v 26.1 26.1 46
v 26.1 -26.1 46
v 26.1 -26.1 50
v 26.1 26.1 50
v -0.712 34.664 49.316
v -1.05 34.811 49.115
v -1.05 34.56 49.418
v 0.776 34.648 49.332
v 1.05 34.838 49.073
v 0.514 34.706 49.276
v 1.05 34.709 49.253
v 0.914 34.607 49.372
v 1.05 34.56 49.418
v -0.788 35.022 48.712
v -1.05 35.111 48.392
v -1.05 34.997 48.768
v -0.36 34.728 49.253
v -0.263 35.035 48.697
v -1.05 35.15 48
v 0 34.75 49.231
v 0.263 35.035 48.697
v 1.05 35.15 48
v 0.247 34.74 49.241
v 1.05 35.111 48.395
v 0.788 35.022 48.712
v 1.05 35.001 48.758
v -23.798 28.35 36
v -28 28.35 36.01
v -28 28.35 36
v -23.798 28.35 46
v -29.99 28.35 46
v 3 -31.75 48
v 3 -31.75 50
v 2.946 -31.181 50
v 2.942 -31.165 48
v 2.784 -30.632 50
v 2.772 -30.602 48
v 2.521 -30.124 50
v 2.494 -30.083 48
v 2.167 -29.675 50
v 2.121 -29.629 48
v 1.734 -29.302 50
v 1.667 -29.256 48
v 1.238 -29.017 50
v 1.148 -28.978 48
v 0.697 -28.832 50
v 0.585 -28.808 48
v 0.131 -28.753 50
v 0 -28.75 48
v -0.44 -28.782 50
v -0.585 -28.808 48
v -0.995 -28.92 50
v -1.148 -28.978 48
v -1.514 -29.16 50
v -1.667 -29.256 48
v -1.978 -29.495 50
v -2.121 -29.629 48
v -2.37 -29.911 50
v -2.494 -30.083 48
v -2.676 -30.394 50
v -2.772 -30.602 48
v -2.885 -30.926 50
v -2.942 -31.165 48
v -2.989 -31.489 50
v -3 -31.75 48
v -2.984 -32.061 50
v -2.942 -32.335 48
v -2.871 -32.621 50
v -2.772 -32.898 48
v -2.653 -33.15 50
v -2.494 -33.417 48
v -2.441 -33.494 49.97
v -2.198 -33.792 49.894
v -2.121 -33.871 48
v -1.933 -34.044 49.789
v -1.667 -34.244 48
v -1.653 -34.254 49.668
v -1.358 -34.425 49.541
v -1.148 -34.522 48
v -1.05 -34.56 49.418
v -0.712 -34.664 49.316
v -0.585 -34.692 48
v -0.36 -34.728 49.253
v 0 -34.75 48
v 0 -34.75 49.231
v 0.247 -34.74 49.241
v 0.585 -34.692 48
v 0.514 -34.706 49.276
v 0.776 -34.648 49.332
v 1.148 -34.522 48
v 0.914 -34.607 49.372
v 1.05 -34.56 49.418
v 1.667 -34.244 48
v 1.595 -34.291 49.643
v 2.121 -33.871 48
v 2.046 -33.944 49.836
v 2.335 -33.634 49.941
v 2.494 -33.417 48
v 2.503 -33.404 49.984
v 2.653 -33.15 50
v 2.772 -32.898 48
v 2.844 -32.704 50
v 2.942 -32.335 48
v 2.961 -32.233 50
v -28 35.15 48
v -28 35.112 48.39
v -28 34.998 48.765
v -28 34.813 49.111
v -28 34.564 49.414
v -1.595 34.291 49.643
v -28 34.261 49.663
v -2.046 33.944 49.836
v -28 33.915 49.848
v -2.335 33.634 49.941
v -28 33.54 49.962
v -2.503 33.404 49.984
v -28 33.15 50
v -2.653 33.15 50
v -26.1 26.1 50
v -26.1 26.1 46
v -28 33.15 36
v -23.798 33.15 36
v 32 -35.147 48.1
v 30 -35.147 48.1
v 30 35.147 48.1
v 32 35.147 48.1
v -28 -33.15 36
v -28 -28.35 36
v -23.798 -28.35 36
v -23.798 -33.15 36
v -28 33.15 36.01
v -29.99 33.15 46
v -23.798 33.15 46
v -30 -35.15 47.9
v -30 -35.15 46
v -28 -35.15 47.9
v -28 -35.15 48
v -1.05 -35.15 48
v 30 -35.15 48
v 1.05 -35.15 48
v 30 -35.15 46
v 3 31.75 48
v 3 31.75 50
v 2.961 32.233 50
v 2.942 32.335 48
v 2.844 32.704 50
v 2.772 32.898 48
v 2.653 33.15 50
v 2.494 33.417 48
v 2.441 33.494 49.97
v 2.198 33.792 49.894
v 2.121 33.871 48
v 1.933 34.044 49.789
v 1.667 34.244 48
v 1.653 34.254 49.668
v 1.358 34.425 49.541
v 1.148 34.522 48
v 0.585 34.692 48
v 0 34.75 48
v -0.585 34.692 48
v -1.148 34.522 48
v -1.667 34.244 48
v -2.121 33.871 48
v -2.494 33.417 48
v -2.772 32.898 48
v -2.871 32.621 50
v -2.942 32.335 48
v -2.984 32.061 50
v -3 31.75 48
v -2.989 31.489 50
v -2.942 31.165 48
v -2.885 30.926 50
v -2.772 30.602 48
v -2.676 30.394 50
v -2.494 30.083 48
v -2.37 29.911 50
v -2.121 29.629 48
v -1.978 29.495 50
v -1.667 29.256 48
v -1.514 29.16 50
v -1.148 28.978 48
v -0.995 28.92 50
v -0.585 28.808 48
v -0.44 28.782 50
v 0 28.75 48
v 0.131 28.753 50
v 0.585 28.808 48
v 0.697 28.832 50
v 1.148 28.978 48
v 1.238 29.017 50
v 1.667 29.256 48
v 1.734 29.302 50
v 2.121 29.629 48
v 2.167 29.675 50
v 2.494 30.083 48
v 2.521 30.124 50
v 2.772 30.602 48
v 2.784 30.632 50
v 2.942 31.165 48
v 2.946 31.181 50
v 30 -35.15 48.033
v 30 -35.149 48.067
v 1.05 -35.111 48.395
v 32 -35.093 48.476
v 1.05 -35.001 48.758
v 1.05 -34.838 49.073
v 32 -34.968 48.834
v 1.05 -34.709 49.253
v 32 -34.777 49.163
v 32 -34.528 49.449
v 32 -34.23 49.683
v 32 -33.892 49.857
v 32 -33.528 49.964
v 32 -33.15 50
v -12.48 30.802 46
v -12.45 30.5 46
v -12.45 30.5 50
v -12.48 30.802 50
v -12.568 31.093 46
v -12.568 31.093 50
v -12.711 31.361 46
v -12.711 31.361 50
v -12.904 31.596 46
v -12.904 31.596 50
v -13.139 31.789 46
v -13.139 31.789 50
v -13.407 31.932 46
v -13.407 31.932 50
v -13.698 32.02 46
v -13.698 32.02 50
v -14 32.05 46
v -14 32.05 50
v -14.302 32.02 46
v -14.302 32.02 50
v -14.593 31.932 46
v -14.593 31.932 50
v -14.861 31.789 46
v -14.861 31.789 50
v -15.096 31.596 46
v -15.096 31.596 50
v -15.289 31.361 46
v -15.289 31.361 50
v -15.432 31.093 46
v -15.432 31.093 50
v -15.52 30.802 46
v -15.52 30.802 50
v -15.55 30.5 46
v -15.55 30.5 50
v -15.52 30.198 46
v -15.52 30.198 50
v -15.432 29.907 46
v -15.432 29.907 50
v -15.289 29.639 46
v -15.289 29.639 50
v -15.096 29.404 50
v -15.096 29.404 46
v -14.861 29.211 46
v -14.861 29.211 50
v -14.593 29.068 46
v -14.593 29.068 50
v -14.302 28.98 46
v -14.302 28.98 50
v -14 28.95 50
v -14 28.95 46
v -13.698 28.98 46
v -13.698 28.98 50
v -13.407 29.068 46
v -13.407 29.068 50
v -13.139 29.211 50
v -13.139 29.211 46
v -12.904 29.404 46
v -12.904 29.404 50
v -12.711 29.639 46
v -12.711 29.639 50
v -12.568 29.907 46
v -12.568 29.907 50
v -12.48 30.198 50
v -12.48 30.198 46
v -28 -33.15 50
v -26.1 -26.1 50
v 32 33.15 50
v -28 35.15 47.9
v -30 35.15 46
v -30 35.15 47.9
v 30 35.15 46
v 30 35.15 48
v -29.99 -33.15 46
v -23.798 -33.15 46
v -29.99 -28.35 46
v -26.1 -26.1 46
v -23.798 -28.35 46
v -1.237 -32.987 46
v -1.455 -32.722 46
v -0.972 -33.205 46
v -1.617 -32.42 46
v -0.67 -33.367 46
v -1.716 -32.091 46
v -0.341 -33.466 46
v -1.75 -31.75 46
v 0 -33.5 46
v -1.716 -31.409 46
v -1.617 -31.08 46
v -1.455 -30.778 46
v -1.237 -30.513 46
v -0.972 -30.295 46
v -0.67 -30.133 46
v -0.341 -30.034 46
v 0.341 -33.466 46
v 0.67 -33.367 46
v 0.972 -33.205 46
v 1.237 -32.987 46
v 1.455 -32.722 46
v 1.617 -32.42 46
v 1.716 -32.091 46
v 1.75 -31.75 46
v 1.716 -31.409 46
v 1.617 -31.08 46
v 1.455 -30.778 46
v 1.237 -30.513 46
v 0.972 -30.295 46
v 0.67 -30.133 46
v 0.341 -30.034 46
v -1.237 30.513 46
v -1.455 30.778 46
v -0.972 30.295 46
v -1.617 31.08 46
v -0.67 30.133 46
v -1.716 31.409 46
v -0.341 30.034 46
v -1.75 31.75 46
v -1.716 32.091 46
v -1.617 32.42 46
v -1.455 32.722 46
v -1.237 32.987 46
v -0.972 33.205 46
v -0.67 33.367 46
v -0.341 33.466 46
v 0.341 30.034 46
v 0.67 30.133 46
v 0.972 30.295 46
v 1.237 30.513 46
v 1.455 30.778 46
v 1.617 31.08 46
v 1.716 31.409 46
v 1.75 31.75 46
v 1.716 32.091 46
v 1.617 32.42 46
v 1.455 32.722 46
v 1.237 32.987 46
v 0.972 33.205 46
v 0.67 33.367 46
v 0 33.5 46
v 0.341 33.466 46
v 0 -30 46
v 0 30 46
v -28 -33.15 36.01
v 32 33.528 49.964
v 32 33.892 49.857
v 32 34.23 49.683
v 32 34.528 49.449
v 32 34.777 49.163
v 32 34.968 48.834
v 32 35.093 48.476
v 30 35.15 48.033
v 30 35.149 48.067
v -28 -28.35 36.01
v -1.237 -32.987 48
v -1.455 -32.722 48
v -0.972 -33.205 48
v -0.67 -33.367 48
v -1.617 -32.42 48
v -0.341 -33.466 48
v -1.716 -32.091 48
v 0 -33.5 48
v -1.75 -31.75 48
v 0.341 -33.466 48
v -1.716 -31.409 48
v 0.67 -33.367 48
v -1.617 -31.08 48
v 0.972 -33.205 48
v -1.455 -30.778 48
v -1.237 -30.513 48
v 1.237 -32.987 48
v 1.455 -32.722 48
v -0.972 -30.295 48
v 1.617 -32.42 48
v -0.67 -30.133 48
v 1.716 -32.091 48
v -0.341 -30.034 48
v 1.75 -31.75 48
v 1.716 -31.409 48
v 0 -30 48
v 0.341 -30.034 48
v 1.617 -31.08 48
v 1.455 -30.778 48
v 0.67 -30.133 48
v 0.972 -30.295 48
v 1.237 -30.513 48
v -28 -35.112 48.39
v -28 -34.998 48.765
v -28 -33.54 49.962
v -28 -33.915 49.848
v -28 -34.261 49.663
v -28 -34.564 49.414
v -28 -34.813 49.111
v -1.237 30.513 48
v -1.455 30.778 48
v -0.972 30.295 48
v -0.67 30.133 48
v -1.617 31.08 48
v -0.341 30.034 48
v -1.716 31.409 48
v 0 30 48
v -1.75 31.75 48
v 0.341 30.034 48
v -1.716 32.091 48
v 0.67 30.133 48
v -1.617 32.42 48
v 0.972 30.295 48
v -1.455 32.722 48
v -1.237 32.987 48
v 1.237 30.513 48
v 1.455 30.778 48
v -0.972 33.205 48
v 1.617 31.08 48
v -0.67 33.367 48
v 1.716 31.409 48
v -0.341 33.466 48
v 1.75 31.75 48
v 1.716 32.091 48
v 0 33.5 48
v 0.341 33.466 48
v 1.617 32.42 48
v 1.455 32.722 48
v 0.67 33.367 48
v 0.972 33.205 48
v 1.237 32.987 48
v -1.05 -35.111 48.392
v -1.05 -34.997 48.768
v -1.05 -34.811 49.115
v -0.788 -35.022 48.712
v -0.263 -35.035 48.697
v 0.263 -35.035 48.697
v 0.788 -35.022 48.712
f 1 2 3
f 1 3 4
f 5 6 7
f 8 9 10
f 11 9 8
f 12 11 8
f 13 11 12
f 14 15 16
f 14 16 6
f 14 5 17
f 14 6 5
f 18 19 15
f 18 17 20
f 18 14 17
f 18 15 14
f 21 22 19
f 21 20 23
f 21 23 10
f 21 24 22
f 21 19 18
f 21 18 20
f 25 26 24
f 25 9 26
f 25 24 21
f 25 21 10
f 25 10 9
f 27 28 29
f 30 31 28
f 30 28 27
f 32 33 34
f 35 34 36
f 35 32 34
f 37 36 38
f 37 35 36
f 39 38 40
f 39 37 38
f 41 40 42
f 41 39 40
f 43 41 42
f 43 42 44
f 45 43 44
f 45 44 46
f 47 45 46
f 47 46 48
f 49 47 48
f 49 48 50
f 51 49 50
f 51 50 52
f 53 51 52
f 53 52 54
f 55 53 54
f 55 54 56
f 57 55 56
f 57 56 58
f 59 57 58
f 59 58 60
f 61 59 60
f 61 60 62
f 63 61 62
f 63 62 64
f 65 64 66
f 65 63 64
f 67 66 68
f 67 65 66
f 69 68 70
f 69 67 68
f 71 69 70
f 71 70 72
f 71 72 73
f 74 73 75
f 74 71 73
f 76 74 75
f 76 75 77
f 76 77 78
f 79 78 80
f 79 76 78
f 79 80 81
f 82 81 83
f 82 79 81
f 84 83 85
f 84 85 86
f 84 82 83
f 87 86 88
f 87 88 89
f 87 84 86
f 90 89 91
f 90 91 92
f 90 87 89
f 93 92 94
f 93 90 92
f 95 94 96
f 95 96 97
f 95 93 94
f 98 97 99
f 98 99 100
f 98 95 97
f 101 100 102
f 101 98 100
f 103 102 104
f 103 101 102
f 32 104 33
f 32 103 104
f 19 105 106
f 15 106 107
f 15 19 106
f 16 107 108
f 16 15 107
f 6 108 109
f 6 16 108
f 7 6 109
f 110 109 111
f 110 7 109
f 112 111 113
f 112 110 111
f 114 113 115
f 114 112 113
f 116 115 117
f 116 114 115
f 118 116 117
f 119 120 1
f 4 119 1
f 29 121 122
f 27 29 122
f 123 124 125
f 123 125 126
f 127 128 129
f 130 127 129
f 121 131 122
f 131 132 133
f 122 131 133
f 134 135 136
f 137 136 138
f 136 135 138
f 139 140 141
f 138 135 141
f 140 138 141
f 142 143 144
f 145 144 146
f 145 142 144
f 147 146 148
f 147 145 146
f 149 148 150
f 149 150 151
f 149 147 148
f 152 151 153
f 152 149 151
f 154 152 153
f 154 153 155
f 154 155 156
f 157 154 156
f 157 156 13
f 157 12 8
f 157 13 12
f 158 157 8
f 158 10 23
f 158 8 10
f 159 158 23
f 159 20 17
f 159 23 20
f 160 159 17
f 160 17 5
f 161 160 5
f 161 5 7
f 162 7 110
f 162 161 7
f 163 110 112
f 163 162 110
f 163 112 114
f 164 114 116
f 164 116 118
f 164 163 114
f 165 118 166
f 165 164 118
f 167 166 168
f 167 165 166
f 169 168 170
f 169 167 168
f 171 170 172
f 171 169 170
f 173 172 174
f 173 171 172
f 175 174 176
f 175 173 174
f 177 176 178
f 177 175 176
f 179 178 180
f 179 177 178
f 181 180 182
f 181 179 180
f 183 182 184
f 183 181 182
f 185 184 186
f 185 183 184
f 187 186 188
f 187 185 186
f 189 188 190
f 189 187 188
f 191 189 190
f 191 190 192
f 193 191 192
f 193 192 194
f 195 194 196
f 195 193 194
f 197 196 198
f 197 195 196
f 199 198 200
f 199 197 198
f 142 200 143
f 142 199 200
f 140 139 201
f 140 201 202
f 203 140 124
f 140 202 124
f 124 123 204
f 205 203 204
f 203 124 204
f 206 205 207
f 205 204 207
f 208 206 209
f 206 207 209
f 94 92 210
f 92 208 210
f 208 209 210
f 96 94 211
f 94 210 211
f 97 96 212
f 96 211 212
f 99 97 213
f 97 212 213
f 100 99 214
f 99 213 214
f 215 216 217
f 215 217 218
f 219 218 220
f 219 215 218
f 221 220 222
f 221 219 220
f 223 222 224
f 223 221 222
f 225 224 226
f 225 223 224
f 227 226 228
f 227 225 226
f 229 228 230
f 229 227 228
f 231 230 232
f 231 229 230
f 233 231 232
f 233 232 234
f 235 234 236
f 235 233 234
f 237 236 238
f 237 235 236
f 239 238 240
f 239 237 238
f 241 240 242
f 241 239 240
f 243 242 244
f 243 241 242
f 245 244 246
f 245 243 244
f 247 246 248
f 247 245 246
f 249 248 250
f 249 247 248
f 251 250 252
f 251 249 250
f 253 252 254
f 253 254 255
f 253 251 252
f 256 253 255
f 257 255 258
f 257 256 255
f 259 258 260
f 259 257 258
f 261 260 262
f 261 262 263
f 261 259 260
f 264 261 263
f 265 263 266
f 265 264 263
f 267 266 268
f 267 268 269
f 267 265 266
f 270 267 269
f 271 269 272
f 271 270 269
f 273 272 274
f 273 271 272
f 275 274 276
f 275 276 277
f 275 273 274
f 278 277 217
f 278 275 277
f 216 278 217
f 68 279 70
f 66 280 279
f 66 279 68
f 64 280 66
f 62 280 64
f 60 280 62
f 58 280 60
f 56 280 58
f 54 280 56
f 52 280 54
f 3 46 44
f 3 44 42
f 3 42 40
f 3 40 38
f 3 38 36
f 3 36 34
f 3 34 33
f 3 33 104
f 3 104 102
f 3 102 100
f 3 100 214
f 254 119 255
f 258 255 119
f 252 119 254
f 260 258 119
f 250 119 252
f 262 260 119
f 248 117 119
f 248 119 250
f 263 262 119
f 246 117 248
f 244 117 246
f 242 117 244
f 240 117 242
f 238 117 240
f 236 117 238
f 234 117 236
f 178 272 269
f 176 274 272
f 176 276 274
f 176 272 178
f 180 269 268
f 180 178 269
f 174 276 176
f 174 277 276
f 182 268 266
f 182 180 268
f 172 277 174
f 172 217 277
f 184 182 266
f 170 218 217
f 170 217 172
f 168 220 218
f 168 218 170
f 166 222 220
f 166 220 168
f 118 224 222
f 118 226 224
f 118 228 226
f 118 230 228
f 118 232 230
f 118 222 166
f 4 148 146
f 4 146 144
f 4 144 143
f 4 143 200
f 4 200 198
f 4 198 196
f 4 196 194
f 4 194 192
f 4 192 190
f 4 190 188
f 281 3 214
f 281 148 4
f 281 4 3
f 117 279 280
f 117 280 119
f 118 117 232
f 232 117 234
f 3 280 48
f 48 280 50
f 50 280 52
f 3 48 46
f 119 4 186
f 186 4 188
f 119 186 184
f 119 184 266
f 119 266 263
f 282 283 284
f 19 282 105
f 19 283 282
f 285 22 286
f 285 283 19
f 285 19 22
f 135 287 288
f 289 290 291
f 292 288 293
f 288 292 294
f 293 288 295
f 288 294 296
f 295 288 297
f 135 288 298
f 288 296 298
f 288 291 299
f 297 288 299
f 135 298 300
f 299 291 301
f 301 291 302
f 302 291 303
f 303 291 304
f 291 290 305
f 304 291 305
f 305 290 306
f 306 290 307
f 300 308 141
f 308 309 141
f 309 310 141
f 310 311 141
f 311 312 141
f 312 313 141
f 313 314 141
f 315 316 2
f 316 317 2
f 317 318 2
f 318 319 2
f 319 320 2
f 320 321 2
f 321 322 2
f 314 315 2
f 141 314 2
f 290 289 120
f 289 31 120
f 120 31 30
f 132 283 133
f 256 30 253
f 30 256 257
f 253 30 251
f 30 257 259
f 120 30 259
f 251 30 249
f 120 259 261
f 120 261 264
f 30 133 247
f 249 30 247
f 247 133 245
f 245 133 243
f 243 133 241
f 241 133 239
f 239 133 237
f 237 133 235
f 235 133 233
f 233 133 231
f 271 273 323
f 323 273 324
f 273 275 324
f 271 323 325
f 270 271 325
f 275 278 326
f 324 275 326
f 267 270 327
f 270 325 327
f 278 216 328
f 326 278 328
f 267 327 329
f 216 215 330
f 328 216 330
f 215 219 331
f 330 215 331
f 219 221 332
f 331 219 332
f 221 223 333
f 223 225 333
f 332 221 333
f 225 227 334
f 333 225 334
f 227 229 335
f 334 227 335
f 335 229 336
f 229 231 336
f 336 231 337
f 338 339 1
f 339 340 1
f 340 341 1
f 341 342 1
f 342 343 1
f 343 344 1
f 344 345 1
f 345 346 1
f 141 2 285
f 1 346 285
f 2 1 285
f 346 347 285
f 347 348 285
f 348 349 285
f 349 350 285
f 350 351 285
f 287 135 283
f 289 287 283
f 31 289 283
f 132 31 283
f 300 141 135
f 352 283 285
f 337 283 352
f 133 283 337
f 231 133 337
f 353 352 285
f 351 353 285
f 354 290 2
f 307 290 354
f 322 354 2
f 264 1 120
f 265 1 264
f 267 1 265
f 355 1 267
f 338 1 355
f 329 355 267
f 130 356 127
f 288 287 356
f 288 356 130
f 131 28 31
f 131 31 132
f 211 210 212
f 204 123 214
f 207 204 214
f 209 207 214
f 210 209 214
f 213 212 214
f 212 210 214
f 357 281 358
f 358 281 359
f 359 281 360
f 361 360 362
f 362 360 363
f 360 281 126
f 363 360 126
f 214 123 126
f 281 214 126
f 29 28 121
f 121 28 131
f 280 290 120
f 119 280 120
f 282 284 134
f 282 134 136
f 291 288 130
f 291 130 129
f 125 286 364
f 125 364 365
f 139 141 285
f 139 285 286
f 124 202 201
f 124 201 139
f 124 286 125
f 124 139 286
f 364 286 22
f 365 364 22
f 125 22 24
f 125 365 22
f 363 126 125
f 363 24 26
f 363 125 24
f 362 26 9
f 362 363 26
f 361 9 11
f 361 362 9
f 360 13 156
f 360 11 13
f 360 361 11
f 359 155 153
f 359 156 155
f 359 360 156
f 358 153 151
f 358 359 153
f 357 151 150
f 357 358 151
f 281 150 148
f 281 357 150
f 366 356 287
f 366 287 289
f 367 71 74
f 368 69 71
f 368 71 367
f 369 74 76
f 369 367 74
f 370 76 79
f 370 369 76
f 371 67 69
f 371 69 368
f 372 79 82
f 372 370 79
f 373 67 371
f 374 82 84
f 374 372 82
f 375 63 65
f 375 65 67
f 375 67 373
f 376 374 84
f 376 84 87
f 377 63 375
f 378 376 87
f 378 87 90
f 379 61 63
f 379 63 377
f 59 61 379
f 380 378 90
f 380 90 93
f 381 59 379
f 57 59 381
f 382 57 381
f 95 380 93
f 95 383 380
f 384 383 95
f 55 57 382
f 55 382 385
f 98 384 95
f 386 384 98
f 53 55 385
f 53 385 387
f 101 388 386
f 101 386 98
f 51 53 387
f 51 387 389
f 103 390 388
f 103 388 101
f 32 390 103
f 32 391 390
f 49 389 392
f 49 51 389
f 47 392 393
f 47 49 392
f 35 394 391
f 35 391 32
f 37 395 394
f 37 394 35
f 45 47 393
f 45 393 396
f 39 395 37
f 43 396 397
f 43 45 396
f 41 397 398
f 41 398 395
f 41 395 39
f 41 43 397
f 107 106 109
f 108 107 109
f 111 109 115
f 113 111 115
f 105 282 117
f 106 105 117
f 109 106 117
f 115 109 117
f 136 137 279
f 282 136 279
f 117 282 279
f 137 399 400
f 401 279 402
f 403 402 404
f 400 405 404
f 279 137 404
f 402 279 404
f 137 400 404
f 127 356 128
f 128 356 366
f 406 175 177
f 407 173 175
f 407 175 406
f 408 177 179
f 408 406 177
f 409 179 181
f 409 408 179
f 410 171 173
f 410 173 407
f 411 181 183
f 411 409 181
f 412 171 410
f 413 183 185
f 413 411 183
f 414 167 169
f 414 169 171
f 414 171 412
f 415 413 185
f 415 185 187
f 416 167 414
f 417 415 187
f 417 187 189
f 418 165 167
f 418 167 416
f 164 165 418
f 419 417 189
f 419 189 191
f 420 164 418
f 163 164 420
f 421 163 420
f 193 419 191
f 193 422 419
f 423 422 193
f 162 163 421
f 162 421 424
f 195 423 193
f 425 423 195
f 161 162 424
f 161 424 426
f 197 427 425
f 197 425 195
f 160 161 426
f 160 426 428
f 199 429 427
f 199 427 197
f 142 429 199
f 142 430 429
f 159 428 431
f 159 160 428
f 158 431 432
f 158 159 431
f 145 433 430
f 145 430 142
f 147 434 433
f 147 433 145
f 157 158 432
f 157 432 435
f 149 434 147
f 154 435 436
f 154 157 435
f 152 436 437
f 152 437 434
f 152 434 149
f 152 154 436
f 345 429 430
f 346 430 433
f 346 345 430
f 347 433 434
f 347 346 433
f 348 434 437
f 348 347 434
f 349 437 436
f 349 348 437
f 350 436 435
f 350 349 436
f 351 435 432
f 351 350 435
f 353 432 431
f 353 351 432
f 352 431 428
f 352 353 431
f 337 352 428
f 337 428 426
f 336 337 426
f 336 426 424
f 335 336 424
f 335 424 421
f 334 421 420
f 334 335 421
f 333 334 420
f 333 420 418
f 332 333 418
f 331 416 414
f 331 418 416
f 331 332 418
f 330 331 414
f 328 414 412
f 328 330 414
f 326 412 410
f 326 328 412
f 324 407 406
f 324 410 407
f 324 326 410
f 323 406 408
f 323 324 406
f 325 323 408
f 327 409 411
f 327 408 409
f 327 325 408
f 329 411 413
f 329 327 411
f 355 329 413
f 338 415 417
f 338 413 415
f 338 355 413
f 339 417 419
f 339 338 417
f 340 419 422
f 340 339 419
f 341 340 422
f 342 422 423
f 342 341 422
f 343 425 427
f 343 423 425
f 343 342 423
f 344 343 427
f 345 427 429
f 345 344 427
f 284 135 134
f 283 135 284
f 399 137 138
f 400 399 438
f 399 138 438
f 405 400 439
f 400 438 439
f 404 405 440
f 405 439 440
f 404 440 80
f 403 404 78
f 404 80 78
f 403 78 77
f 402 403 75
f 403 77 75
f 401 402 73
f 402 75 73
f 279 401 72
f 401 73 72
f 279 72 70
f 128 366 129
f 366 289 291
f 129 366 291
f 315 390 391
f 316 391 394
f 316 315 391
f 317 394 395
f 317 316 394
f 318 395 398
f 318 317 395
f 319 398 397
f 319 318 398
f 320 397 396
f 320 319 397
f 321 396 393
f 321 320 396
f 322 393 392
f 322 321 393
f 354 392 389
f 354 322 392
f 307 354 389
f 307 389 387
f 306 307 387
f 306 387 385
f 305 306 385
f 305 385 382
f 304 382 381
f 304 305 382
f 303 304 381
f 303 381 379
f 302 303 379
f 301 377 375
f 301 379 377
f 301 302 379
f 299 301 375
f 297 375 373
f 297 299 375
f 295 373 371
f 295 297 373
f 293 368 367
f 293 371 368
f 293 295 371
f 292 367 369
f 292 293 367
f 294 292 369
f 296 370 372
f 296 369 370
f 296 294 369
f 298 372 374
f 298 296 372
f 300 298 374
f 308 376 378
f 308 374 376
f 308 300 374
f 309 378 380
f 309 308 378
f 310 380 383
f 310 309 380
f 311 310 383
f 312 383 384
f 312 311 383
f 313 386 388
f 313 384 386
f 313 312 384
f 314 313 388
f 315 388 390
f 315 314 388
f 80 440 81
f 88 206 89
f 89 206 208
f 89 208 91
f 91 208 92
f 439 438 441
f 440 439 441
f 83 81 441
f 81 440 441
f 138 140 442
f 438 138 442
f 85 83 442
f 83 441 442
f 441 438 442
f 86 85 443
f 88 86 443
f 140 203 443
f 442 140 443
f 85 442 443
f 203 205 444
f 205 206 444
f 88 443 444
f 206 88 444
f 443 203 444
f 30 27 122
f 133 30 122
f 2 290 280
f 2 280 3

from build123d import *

# Parameters (mm, degrees)
SKETCH077_W          = 62
SKETCH077_H          = 70.3
SKETCH077_R          = 1.75
SKETCH077_R_2        = 1.55
SKETCH077_W_2        = 52.2
SKETCH077_H_2        = 52.2
PAD021_DEPTH         = 4
FILLET009_R          = 2
SKETCH078_W          = 2
SKETCH078_H          = 2.1
POCKET050_DEPTH      = 35.151
POCKET050_DEPTH_BACK = 35.151
SKETCH079_R          = 3
POCKET028_DEPTH      = 2.001
SKETCH081_W          = 4.202
SKETCH081_H          = 4.8
PAD023_DEPTH         = 10
CHAMFER003_SIZE2     = 9.99
CHAMFER003_SIZE      = 1.99


with BuildPart() as part:
    # Sketch077 → Pad021 (new body)
    with BuildSketch(Plane.XY):
        with Locations((1, 0)):
            Rectangle(SKETCH077_W, SKETCH077_H)
        with Locations((0, 31.75)):
            Circle(SKETCH077_R, mode=Mode.SUBTRACT)
        with Locations((0, -31.75)):
            Circle(SKETCH077_R, mode=Mode.SUBTRACT)
        with Locations((-14, 30.5)):
            Circle(SKETCH077_R_2, mode=Mode.SUBTRACT)
        Rectangle(SKETCH077_W_2, SKETCH077_H_2, mode=Mode.SUBTRACT)
    extrude(amount=PAD021_DEPTH)

    # Fillet009
    fillet009_edges = [part.edges().sort_by_distance(p)[0] for p in [
        (1, 35.15, 4),
        (1, -35.15, 4),
    ]]
    fillet(fillet009_edges, radius=FILLET009_R)

    # Sketch078 → Pocket050 (cut, two sides)
    with BuildSketch(Plane.XZ) as pocket050_sk:
        with Locations((-29, 2.95)):
            Rectangle(SKETCH078_W, SKETCH078_H)
        with Locations((31, 1.05)):
            Rectangle(SKETCH078_W, SKETCH078_H)
    extrude(amount=-POCKET050_DEPTH, mode=Mode.SUBTRACT)
    extrude(pocket050_sk.sketch, amount=POCKET050_DEPTH_BACK, mode=Mode.SUBTRACT)

    # Sketch079 → Pocket028 (cut, through all)
    with BuildSketch(Plane.XY.offset(2)):
        with Locations((0, -31.75)):
            Circle(SKETCH079_R)
        with Locations((0, 31.75)):
            Circle(SKETCH079_R)
    extrude(amount=POCKET028_DEPTH, mode=Mode.SUBTRACT)

    # Sketch081 → Pad023 (join)
    with BuildSketch(Plane.XY):
        with Locations((-25.899, 30.75)):
            Rectangle(SKETCH081_W, SKETCH081_H)
        with Locations((-25.899, -30.75)):
            Rectangle(SKETCH081_W, SKETCH081_H)
    extrude(amount=-PAD023_DEPTH)

    # Chamfer003
    chamfer003_edges = [part.edges().sort_by_distance(p)[0] for p in [
        (-28, 30.75, 0),
        (-28, -30.75, 0),
    ]]
    chamfer003_side = part.faces().sort_by_distance((-29.075766, 0, 0))[0]
    chamfer(chamfer003_edges, length=CHAMFER003_SIZE, length2=CHAMFER003_SIZE2, reference=chamfer003_side)


with BuildPart() as part_1:
    # Body058 placement: moved
    add(part.part.moved(Location((0, 0, 46))))


solid = part_1.part
